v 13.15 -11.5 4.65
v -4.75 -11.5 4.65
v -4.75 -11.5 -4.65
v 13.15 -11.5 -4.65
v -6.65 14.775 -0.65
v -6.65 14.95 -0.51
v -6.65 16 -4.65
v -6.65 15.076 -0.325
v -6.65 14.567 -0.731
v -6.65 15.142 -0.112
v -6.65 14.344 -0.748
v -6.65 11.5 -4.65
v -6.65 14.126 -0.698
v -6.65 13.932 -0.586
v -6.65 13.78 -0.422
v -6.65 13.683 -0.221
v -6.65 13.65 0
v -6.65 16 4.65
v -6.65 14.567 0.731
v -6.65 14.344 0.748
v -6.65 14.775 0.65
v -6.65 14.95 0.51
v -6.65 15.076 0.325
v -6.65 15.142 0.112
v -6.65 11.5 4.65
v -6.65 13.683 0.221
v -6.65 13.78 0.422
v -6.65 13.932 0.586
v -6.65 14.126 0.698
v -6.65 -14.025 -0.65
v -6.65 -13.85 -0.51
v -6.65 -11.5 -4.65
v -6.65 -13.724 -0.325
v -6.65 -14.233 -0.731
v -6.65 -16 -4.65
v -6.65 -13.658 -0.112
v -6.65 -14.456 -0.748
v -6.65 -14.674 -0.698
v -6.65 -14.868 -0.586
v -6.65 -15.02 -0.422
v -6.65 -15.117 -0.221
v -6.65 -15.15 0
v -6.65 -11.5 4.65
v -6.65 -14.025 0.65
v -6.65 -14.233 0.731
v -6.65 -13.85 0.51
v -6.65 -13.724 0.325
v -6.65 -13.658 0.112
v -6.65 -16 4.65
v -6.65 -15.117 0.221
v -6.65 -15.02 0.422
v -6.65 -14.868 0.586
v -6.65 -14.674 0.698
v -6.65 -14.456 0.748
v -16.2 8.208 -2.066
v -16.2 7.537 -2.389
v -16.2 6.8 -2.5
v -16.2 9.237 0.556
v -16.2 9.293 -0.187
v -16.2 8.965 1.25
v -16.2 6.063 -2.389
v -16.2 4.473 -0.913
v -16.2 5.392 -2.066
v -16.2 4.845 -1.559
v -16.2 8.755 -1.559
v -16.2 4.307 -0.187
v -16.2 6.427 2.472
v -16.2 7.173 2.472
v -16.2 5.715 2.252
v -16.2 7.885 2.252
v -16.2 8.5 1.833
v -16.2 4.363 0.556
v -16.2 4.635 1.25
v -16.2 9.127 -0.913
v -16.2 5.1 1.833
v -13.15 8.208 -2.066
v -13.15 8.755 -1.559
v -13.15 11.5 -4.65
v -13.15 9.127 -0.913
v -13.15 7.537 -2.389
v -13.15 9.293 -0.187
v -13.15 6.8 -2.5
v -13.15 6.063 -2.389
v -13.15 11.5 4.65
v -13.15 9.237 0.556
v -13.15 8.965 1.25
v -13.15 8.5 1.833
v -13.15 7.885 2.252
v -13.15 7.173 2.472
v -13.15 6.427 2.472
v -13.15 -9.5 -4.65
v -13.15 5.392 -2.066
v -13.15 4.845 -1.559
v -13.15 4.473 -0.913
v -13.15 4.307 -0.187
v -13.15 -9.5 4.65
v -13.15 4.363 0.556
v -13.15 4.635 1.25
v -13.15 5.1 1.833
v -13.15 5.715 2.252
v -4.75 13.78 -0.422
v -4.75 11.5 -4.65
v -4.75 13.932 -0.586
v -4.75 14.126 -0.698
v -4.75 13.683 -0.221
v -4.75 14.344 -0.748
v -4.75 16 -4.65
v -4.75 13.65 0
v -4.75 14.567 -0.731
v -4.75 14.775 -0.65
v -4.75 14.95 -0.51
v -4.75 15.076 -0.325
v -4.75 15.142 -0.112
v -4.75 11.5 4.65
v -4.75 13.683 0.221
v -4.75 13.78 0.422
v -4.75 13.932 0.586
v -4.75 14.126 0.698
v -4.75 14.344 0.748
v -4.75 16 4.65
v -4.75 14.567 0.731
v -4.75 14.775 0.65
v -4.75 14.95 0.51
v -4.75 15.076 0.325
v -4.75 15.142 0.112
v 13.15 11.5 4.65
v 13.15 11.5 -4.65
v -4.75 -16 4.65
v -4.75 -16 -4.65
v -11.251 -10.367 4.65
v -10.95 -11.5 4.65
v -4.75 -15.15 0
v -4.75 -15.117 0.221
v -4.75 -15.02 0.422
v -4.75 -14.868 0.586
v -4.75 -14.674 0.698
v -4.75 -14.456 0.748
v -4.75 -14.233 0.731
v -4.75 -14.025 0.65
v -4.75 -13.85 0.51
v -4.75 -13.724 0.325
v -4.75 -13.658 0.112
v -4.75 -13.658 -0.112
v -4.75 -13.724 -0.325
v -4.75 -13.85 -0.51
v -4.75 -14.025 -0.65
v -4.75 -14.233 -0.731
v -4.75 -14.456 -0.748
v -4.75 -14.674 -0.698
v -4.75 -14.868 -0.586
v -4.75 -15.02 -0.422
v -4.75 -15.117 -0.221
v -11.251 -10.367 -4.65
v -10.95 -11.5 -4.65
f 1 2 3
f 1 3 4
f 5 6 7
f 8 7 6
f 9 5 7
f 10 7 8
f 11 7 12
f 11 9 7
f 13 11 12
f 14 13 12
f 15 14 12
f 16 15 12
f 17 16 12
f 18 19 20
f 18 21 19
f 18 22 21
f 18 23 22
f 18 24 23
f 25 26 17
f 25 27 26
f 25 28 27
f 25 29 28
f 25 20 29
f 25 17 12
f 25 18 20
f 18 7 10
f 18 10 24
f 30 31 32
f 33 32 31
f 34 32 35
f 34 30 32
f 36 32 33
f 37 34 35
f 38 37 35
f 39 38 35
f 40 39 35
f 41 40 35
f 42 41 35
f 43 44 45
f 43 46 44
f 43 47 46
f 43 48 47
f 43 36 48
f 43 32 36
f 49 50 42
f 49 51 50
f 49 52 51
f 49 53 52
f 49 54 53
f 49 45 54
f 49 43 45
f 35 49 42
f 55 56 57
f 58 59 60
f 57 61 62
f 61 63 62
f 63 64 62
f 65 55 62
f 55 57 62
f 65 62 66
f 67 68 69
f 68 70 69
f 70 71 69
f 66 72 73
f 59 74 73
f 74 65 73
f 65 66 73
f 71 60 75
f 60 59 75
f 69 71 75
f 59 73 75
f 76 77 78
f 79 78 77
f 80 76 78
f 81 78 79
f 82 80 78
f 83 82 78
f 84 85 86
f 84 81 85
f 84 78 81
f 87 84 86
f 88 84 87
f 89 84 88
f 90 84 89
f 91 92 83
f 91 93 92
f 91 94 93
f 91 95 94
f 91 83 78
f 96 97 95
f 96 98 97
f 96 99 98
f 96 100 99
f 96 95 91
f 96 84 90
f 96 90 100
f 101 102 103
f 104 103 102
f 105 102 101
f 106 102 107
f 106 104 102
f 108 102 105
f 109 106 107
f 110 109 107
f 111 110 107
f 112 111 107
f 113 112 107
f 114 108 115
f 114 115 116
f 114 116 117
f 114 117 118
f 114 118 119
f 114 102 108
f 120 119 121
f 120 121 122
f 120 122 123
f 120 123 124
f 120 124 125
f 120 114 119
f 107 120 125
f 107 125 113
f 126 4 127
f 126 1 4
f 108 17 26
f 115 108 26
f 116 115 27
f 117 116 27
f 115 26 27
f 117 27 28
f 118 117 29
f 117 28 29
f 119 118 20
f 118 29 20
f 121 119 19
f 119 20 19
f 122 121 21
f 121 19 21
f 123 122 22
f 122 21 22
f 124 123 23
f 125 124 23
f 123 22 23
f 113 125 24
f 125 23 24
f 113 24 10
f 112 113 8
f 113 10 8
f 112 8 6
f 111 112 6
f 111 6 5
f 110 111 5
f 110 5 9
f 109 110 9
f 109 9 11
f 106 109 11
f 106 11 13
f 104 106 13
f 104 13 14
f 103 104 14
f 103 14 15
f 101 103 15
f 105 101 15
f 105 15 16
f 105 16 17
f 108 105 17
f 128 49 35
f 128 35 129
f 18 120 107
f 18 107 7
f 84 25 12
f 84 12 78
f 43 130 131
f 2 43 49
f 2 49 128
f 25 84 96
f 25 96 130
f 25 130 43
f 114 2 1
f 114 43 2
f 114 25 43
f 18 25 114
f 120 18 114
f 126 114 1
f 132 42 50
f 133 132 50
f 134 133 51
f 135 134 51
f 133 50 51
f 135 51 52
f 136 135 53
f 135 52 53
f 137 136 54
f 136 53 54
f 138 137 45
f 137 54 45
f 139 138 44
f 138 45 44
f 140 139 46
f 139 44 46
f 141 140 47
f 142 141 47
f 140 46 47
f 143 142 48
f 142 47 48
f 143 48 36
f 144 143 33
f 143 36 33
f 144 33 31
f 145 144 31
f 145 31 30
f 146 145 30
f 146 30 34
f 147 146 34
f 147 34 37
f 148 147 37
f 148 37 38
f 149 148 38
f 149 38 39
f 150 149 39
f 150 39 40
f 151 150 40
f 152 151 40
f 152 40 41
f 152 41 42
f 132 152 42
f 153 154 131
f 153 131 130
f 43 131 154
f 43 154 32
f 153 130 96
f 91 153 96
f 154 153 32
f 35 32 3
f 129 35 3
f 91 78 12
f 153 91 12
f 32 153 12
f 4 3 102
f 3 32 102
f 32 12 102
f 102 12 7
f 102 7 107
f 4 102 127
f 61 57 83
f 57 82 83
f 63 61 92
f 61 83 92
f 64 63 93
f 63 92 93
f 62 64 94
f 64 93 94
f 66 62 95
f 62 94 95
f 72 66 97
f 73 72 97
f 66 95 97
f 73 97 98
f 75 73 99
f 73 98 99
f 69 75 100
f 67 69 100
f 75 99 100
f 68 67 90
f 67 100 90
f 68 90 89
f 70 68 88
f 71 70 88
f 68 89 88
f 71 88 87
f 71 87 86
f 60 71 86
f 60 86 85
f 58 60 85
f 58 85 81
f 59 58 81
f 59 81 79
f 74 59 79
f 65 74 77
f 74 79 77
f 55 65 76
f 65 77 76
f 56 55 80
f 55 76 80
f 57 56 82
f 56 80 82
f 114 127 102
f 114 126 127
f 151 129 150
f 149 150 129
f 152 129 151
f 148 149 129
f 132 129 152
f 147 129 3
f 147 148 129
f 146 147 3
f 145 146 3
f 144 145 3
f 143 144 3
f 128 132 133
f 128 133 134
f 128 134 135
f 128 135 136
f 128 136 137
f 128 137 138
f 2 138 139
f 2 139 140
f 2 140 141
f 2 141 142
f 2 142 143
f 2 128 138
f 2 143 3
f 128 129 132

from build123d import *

# Parameters (mm, degrees)
BOSS_EXTRUDE1_DEPTH     = 4.65
CUT_EXTRUDE4_DEPTH      = 22.226045322
CUT_EXTRUDE4_DEPTH_BACK = 22.226045322
SKETCH3_W               = 3.05
SKETCH3_H               = 2.5
SKETCH4_R               = 0.75
CUT_EXTRUDE1_DEPTH      = 10


with BuildPart() as part:
    # Sketch1 → Boss-Extrude1 (new, symmetric)
    with BuildSketch(Plane.XY):
        Polygon((-4.75, 11.5), (-4.75, 16), (-6.65, 16), (-6.65, 11.5), (-13.15, 11.5), (-13.15, -9.5), (-13.15, -11.5), (-10.95, -11.5), (-6.65, -11.5), (-6.65, -16), (-4.75, -16), (-4.75, -11.5), (13.15, -11.5), (13.15, 11.5), align=None)
    extrude(amount=BOSS_EXTRUDE1_DEPTH, both=True)

    # Sketch7 → Cut-Extrude4 (cut, two sides: drawn at the far end of the back side and taken through both)
    with BuildSketch(Plane.XY.offset(-CUT_EXTRUDE4_DEPTH_BACK)):
        Polygon((-11.251215972, -10.366937752), (-13.15, -9.5), (-13.15, -11.5), (-10.95, -11.5), align=None)
    extrude(amount=CUT_EXTRUDE4_DEPTH + CUT_EXTRUDE4_DEPTH_BACK, mode=Mode.SUBTRACT)

    # Sketch3 → Revolve1 (revolve)
    with BuildSketch(Plane.XY, mode=Mode.PRIVATE) as revolve1_sk:
        with Locations((-14.675, 8.05)):
            Rectangle(SKETCH3_W, SKETCH3_H)
    revolve(revolve1_sk.sketch.rotate(Axis((-13.15, 6.8, 0), (-1, 0, 0)), 90), axis=Axis((-13.15, 6.8, 0), (-1, 0, 0)))

    # Sketch4 → Cut-Extrude1 (cut)
    with BuildSketch(Plane.ZY.offset(6.65)):
        with Locations(Location((0, 14.4, 0), (0, 0, 270))):
            Circle(SKETCH4_R)
        with Locations(Location((0, -14.4, 0), (0, 0, 270))):
            Circle(SKETCH4_R)
    extrude(amount=-CUT_EXTRUDE1_DEPTH, mode=Mode.SUBTRACT)


solid = part.part
